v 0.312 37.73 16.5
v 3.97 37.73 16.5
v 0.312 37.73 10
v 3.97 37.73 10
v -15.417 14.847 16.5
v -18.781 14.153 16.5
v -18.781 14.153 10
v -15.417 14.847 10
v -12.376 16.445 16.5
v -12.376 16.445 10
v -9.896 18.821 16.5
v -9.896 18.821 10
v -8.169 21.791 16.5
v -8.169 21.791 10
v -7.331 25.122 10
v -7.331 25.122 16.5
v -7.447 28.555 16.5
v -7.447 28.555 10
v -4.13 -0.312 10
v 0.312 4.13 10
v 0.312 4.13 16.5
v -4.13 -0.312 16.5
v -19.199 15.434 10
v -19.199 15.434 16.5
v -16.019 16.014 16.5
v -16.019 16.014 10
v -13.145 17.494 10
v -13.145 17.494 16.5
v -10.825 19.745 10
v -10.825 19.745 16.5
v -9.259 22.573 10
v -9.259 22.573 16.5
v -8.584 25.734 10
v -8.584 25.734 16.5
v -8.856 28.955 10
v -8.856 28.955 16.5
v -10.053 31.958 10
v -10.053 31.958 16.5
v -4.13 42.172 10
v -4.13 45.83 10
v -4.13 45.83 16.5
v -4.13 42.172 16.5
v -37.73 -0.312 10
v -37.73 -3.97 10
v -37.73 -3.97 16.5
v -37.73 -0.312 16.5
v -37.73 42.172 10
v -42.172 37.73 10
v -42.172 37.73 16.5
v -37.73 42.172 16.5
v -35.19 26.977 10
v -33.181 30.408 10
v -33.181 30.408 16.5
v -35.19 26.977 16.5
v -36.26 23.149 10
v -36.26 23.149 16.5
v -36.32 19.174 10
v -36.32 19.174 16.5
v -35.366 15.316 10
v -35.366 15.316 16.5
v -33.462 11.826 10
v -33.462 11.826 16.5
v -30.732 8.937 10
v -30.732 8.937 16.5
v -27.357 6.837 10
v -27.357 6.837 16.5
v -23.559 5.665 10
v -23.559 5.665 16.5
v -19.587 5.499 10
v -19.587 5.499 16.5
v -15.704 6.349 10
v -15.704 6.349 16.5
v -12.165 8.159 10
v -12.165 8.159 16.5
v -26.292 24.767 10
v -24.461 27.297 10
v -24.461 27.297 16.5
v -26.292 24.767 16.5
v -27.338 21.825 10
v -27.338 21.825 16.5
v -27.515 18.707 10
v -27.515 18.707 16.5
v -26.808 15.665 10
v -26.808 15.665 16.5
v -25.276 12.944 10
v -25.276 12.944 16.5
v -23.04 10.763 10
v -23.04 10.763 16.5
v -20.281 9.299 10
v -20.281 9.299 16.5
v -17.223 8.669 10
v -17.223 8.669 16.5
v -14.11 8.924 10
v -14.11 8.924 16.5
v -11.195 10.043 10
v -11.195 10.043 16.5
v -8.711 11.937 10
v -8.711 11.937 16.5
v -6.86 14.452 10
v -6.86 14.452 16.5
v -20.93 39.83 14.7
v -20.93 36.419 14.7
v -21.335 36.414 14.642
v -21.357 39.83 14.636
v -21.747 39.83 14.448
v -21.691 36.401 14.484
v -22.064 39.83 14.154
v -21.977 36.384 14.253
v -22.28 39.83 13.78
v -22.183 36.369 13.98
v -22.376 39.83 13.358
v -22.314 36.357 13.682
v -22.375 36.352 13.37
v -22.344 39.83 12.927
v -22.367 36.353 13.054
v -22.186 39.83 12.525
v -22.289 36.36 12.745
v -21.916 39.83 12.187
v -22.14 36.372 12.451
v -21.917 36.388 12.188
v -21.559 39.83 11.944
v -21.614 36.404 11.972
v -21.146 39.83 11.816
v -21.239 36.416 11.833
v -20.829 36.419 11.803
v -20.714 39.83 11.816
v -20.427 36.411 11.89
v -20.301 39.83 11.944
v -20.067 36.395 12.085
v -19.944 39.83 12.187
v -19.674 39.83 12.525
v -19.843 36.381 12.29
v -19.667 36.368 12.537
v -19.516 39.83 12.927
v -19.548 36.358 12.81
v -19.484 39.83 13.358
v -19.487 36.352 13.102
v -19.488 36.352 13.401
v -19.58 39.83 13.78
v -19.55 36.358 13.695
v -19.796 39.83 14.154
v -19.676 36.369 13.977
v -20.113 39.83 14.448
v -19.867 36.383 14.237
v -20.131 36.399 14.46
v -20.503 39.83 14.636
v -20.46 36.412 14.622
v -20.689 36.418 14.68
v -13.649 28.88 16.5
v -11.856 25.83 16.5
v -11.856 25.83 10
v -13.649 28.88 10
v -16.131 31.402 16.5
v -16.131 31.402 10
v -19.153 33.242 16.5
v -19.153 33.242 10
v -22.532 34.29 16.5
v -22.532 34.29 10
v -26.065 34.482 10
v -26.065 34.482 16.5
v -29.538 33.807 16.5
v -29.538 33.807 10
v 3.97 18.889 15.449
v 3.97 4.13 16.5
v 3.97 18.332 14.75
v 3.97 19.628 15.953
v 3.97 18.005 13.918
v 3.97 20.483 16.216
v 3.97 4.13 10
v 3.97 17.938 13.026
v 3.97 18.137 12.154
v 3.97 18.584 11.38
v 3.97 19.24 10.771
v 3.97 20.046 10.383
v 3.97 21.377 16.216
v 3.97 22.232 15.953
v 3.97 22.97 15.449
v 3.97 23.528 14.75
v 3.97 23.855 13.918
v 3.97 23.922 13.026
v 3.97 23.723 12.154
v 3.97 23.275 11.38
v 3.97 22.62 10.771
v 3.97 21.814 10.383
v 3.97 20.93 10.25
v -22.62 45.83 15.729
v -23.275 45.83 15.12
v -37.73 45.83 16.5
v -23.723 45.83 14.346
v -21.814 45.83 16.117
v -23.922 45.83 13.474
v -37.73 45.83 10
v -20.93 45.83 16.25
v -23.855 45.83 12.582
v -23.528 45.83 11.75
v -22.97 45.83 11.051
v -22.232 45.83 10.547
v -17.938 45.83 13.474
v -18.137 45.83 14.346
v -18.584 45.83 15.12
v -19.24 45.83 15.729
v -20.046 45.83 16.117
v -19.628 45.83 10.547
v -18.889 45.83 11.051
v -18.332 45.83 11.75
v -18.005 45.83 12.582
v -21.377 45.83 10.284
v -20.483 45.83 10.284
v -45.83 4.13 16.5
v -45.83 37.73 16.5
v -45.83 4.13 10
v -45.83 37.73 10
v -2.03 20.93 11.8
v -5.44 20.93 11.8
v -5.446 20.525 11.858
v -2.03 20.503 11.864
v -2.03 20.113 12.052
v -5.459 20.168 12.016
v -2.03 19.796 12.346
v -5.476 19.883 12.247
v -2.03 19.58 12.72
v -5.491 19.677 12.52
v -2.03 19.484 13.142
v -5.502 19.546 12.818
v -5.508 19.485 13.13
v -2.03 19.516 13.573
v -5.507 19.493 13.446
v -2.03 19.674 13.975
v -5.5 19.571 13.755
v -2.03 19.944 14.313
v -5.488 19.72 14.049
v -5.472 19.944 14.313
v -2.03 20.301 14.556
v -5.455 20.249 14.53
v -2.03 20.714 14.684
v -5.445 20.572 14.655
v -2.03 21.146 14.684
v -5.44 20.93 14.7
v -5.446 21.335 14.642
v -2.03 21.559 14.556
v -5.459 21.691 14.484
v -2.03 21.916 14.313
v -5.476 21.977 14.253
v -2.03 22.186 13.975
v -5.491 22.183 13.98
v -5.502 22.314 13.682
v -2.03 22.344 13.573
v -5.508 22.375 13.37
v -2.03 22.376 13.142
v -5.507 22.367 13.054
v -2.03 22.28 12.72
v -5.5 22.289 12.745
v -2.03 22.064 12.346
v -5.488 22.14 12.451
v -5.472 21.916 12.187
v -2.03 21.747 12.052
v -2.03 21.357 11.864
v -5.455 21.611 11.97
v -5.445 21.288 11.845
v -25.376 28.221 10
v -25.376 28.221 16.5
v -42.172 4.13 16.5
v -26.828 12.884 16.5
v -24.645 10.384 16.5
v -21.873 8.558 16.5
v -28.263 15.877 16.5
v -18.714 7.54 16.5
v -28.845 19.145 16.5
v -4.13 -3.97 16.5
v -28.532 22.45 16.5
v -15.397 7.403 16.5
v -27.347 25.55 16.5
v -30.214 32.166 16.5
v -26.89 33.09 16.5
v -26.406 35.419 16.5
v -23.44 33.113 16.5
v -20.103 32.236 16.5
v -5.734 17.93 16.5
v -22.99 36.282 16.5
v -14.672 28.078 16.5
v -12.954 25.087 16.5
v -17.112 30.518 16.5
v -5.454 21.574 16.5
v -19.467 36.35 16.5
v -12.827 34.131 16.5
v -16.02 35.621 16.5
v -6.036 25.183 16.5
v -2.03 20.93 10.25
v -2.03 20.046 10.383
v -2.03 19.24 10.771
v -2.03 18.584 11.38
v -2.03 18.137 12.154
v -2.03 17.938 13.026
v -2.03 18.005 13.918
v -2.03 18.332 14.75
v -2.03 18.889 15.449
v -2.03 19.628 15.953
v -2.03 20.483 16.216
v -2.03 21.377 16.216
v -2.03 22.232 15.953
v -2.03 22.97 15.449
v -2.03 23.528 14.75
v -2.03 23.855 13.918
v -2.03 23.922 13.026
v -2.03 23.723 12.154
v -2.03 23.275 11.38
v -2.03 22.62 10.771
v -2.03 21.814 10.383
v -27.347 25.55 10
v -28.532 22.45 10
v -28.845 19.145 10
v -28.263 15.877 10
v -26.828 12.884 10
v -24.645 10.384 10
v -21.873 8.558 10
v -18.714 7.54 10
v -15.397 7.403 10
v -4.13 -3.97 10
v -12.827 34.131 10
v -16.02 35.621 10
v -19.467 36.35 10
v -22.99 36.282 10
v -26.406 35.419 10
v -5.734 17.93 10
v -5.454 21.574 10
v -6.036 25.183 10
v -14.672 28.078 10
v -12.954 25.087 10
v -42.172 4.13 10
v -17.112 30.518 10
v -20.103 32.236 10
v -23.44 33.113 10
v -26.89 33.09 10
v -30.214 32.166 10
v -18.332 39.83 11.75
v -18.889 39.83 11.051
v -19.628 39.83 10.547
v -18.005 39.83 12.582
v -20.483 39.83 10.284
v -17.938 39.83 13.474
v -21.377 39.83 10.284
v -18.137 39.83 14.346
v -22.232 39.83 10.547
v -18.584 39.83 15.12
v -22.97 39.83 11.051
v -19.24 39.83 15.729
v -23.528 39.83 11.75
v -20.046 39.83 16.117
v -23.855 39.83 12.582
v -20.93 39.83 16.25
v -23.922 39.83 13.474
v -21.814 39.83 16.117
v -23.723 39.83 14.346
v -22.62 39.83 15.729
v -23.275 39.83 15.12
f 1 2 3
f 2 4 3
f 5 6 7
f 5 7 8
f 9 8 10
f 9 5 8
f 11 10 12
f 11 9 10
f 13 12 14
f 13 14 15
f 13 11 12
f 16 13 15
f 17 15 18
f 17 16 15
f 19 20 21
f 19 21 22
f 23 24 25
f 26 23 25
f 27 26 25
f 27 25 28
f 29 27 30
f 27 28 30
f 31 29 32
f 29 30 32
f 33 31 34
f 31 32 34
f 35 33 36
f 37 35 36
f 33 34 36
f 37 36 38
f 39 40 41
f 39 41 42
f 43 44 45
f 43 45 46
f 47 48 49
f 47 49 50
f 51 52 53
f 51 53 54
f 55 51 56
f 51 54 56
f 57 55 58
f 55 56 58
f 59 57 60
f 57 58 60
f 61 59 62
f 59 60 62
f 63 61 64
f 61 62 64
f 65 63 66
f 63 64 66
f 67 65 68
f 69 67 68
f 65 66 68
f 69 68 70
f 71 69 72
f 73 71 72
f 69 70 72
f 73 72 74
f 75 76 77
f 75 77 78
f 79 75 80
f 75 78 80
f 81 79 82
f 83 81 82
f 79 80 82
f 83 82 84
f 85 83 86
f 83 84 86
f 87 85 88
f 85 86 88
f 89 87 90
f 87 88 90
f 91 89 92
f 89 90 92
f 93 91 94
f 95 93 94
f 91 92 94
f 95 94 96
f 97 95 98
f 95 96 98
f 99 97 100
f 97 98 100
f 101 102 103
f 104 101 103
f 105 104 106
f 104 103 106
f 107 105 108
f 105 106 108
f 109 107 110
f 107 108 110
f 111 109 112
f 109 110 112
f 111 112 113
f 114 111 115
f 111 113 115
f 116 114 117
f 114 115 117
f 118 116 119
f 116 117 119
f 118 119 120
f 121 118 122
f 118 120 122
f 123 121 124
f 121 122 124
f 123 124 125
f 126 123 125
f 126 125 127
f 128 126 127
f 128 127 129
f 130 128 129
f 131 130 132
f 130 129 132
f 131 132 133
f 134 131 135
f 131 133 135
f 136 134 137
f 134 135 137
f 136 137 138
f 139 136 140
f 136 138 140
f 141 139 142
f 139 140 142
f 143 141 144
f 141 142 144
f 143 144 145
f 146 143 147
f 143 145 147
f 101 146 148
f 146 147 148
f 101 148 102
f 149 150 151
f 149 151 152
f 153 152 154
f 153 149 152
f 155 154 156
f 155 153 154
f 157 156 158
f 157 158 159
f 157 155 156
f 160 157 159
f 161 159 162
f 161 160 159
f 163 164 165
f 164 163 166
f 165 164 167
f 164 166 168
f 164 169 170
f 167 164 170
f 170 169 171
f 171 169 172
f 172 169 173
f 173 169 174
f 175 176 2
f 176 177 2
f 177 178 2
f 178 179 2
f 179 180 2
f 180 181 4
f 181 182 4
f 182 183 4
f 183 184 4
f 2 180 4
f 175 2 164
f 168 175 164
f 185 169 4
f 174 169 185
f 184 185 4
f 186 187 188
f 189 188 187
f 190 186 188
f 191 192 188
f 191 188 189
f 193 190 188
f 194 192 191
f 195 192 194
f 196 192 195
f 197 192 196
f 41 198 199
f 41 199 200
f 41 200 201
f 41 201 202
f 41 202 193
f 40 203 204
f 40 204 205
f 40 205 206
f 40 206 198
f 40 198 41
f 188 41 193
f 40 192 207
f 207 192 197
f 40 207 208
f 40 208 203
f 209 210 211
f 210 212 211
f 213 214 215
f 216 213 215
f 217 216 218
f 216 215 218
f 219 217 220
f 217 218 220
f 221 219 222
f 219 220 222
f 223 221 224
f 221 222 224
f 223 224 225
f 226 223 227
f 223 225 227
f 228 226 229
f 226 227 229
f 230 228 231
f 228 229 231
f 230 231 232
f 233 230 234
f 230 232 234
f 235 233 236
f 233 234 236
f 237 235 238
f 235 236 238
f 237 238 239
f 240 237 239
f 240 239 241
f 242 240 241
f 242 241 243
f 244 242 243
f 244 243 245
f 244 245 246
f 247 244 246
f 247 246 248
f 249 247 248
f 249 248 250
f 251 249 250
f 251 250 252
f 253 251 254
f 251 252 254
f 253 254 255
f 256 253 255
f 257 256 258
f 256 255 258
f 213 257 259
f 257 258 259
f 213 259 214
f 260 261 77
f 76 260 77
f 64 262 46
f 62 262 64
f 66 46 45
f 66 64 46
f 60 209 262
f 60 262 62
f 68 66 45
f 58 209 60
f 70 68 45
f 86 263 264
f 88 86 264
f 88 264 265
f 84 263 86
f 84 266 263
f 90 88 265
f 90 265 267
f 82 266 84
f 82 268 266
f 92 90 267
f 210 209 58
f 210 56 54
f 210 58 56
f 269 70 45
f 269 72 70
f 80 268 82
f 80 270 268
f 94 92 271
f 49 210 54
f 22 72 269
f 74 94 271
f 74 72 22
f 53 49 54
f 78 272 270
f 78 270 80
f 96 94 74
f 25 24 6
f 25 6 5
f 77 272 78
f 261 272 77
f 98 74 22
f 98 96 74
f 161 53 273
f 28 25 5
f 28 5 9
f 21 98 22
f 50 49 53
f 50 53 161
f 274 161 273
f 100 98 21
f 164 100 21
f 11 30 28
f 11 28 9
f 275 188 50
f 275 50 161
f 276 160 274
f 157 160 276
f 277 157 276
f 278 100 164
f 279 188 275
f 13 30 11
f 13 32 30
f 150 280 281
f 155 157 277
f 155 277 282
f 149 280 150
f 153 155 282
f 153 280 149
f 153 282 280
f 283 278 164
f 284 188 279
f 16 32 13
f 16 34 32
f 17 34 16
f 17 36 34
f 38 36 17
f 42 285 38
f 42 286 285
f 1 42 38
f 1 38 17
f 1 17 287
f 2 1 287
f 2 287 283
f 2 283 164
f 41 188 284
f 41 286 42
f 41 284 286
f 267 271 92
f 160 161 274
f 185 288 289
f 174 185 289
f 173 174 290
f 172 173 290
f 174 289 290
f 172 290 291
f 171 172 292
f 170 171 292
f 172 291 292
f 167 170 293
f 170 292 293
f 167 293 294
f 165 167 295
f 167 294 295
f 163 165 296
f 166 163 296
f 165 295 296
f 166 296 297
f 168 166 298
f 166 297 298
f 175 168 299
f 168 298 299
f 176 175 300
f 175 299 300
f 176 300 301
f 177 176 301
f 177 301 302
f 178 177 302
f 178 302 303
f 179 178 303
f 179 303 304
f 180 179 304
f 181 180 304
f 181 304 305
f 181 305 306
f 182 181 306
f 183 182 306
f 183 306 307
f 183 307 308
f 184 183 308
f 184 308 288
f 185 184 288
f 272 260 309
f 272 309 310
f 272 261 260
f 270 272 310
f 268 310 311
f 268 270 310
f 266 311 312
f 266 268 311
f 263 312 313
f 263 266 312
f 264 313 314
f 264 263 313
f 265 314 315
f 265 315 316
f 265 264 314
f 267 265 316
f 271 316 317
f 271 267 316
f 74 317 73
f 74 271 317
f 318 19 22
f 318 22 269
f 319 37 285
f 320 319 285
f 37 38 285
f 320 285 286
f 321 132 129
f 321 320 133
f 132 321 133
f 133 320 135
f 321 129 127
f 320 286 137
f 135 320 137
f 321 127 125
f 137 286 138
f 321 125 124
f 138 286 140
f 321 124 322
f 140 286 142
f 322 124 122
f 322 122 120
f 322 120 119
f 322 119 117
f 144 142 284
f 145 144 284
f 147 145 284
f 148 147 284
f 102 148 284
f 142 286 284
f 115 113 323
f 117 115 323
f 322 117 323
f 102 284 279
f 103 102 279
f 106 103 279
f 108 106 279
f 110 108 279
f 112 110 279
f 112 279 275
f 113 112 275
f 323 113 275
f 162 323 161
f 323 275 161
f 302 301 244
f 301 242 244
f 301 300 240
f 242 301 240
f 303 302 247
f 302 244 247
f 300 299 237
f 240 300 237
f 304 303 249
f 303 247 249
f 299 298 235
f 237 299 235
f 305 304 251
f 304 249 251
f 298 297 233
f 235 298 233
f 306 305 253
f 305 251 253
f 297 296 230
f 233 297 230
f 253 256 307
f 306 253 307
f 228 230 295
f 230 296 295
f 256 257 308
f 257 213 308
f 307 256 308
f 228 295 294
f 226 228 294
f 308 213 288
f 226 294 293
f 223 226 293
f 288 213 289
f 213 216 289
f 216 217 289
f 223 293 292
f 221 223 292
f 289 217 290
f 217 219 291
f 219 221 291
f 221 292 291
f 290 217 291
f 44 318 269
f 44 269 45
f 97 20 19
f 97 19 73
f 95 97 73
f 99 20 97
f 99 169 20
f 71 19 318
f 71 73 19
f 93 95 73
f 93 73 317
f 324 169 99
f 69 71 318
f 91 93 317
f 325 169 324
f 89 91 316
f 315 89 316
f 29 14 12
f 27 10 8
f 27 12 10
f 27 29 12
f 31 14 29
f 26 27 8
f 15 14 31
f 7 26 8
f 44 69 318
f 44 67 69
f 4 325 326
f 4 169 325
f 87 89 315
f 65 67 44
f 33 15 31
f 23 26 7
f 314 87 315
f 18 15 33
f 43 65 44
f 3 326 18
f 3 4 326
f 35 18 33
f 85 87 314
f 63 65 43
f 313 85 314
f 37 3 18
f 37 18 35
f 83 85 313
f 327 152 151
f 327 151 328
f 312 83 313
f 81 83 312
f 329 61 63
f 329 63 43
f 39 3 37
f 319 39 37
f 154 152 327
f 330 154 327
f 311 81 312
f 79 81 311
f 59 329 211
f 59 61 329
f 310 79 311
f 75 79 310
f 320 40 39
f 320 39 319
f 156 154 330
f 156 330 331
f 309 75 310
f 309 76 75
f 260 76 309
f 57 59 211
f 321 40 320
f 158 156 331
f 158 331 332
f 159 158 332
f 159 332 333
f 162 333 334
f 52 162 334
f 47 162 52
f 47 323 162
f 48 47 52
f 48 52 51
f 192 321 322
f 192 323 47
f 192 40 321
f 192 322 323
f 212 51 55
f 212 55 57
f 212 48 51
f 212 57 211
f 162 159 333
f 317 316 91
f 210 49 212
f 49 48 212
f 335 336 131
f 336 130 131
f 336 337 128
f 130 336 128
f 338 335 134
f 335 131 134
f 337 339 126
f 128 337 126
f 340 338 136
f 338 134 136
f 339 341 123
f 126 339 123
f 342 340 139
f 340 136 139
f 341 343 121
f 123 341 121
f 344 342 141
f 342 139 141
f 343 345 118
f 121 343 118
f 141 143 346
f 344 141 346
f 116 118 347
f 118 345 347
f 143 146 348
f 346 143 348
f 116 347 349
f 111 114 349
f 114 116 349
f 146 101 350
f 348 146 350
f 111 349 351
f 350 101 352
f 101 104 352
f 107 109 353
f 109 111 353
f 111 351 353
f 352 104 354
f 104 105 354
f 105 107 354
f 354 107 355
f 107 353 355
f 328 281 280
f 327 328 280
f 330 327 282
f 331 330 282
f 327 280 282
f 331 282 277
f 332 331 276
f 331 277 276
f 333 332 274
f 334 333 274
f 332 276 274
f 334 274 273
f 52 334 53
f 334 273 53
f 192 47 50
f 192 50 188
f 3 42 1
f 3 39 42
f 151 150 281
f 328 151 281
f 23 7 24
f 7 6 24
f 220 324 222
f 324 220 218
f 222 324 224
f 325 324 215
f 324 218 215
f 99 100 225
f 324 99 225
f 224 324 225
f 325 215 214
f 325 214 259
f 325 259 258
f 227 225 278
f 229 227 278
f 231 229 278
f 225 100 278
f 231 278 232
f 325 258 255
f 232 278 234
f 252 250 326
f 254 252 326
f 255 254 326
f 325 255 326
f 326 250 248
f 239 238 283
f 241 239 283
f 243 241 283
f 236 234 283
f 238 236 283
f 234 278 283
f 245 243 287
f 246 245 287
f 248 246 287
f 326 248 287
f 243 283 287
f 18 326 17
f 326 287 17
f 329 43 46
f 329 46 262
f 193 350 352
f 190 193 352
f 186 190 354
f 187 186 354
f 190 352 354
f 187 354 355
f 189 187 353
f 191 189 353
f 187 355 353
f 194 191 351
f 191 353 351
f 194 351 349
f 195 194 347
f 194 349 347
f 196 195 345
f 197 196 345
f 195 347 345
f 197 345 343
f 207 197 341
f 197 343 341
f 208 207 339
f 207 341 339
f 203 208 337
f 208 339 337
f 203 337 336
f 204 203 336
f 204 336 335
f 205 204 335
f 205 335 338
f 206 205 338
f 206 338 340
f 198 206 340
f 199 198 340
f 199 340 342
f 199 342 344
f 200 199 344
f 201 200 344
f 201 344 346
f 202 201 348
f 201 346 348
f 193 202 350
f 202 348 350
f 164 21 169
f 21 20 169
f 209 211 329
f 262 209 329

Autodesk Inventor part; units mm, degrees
ref_plane "YZ Plane" through (0, 0, 0) normal (1, 0, 0) x (0, 1, 0)
ref_plane "Work Plane1" through (0, 0, 10) normal (0, 0, 1) x (1, 0, 0)
sketch "Sketch1" plane through (0, 0, 10) normal (0, 0, 1) x (1, 0, 0)
  line L0 (-4.0299, -0.3538) -> (-2.2322, 1.4439) construction
  arc A0 (-1.4439, 2.2322) -> (-2.2322, 1.4439) centre (-0.9299, 0.9299) ccw construction
  line L1 (-1.4439, 2.2322) -> (0.3538, 4.0299) construction
  line L2 (-37.8299, 42.2137) -> (-37.8299, 45.8299) construction
  line L3 (-37.8299, 45.8299) -> (-4.0299, 45.8299) construction
  line L4 (-4.0299, 45.8299) -> (-4.0299, 42.2137) construction
  line L5 (-4.0299, 4.0299) -> (0.3538, 4.0299) projected
  line L6 (-20.9299, 58.9723) -> (17.1124, 20.9299) construction
  line L7 (17.1124, 20.9299) -> (-20.9299, -17.1124) construction
  line L8 (-20.9299, -17.1124) -> (-58.9723, 20.9299) construction
  line L9 (-58.9723, 20.9299) -> (-20.9299, 58.9723) construction
  line L10 (-20.9299, 58.9723) -> (-20.9299, -17.1124) construction
  line L11 (17.1124, 20.9299) -> (-58.9723, 20.9299) construction
  line L12 (-20.9299, 58.9723) -> (32.8701, 58.9723) construction
  line L13 (-43.4299, 43.4299) -> (1.5701, 43.4299) construction
  line L14 (1.5701, 43.4299) -> (1.5701, -1.5701) construction
  line L15 (1.5701, -1.5701) -> (-43.4299, -1.5701) construction
  line L16 (-43.4299, -1.5701) -> (-43.4299, 43.4299) construction
  line L17 (-43.4299, 43.4299) -> (1.5701, -1.5701) construction
  line L18 (1.5701, 43.4299) -> (-43.4299, -1.5701) construction
  line L19 (-43.4299, 5.3876) -> (-43.4299, 36.4723)
  line L20 (-43.4299, 36.4723) -> (-36.4723, 43.4299)
  line L21 (-36.4723, 43.4299) -> (-5.3876, 43.4299)
  line L22 (-5.3876, 43.4299) -> (1.5701, 36.4723)
  line L23 (1.5701, 36.4723) -> (1.5701, 5.3876)
  line L24 (1.5701, 5.3876) -> (-5.3876, -1.5701)
  line L25 (-5.3876, -1.5701) -> (-36.4723, -1.5701)
  line L26 (-36.4723, -1.5701) -> (-43.4299, 5.3876)
  line L27 (-4.0299, 42.2137) -> (-37.8299, 42.2137) projected
  line L28 (-4.0299, -0.3538) -> (-4.0299, 4.0299) projected
  circle A1 centre (-20.9299, 20.9299) radius 13.3985
  circle A2 centre (-20.9299, 20.9299) radius 15.4895
  point P0 (-37.8299, 4.0299)
  dimension "d18" = 53.8
  dimension "d19" = 45
  dimension "d20" = 53.8
  dimension "d21" = 45
  dimension "d22" = 45
  dimension "d30" = 26.797
  dimension "d36" = 30.979
extrude "Extrusion1" add sketch "Sketch1" along normal blind 6.5 contours L28 L24 L25 L26 L19 L20 L27 L22 L23 L5 | L5 L24 L28 | L27 L20 L21 L22 | A1 | A2
ref_plane "Work Plane2" through (-40.9959, 0.8639, 22.2359) normal (0, 0, 1) x (1, 0, 0)
sketch "Sketch3" plane through (0, 0, 10) normal (0, 0, -1) x (-1, 0, 0)
  line L0 (37.8299, -0.4701) -> (37.8299, 4.0299) construction
  line L1 (4.0299, 4.0299) -> (4.0299, -0.4701) construction
  line L2 (37.8299, -0.4701) -> (37.8299, 1.1886) construction
  line L3 (4.0299, -3.9701) -> (4.0299, -0.3538) construction
  line L4 (45.8299, 4.0299) -> (42.2137, 4.0299) construction
  line L5 (-0.3538, 4.0299) -> (-3.9701, 4.0299) construction
  line L6 (-3.9701, 37.8299) -> (-0.3538, 37.8299) construction
  line L7 (4.0299, 42.2137) -> (4.0299, 45.8299) construction
  line L8 (37.8299, 45.8299) -> (37.8299, 42.2137) construction
  line L9 (42.2137, 37.8299) -> (45.8299, 37.8299) construction
  line L10 (37.8299, 37.7299) -> (45.8299, 37.7299)
  line L11 (45.8299, 37.7299) -> (45.8299, 4.1299)
  line L12 (45.8299, 4.1299) -> (37.8299, 4.1299)
  line L13 (37.8299, 4.1299) -> (37.8299, 37.7299)
  line L14 (37.7299, 4.0299) -> (4.1299, 4.0299)
  line L15 (4.1299, 4.0299) -> (4.1299, -3.9701)
  line L16 (4.1299, -3.9701) -> (37.7299, -3.9701)
  line L17 (37.7299, -3.9701) -> (37.7299, 4.0299)
  line L18 (4.0299, 4.1299) -> (-3.9701, 4.1299)
  line L19 (-3.9701, 4.1299) -> (-3.9701, 37.7299)
  line L20 (-3.9701, 37.7299) -> (4.0299, 37.7299)
  line L21 (4.0299, 37.7299) -> (4.0299, 4.1299)
  line L22 (4.1299, 37.8299) -> (37.7299, 37.8299)
  line L23 (37.7299, 37.8299) -> (37.7299, 45.8299)
  line L24 (37.7299, 45.8299) -> (4.1299, 45.8299)
  line L25 (4.1299, 45.8299) -> (4.1299, 37.8299)
  point P0 (0, 0)
  dimension "d23" = 0.1
  dimension "d24" = 0.1
  dimension "d25" = 0.1
  dimension "d26" = 0.1
  dimension "d27" = 0.1
extrude "Extrusion3" add sketch "Sketch3" against normal up to surface (6.5 mm away)
sketch "Sketch6" plane through (0, 0, 16.5) normal (0, 0, 1) x (1, 0, 0)
  circle A0 centre (-20.9299, 20.9299) radius 15.4895
  circle A1 centre (-20.9299, 20.9299) radius 13.3985
  line L0 (-45.8299, 4.1299) -> (-45.8299, 37.7299) projected
  line L1 (-4.1299, -3.9701) -> (-37.7299, -3.9701) projected
  line L2 (-37.7299, 45.8299) -> (-4.1299, 45.8299) projected
  point P0 (0, 0)
  point P1 (-45.8299, 20.9299)
  point P2 (-20.9299, -3.9701)
  point P3 (-20.9299, 45.8299)
  dimension "d37" = 26.797
  dimension "d38" = 30.979
extrude "Extrusion5" cut sketch "Sketch6" against normal blind 12 contours A0 | A1
sketch "Sketch7" plane through (0, 0, 16.5) normal (0, 0, 1) x (1, 0, 0)
  arc A0 (-12.9538, 25.0869) -> (-28.6747, 7.5156) centre (-25.0755, 20.1138) ccw
  arc A1 (-11.8561, 25.8297) -> (-29.5384, 33.807) centre (-25.0755, 20.1138) ccw
  line L0 (-11.8561, 25.8297) -> (-12.9538, 25.0869)
  arc A2 (-29.5384, 33.807) -> (-28.6747, 7.5156) centre (-20.9299, 20.9299) ccw
  arc A3 (-19.1989, 15.4337) -> (-10.0534, 31.9583) centre (-19.562, 26.4277) ccw
  arc A4 (-7.4473, 28.5552) -> (-10.0534, 31.9583) centre (-19.6452, 21.9138) ccw
  line L1 (-19.4299, 22.4299) -> (-3.5175, 22.4299) construction
  arc A5 (-25.3758, 28.221) -> (-12.1653, 8.1586) centre (-16.5552, 19.6486) ccw
  circle A6 centre (-20.9299, 20.9299) radius 15.4895 construction
  arc A7 (-12.4299, 22.4299) -> (-19.1989, 15.4337) centre (-19.4299, 22.4299) ccw construction
  line L2 (-25.3758, 28.221) -> (-24.4607, 27.2973)
  arc A8 (-24.4607, 27.2973) -> (-6.8601, 14.452) centre (-16.5552, 19.6486) ccw
  circle A9 centre (-20.9299, 20.9299) radius 15.4895 construction
  line L3 (3.9701, 4.1299) -> (0.3124, 4.1299) construction
  line L4 (3.9701, 37.7299) -> (3.9701, 4.1299) construction
  line L5 (0.3124, 37.7299) -> (3.9701, 37.7299) construction
  line L6 (0.3124, 37.7299) -> (-4.1299, 42.1723) construction
  line L7 (-4.1299, 45.8299) -> (-4.1299, 42.1723) construction
  line L8 (-37.7299, 45.8299) -> (-4.1299, 45.8299) construction
  line L9 (-37.7299, 42.1723) -> (-37.7299, 45.8299) construction
  line L10 (-37.7299, 42.1723) -> (-42.1723, 37.7299) construction
  line L11 (-45.8299, 37.7299) -> (-42.1723, 37.7299) construction
  line L12 (-45.8299, 4.1299) -> (-45.8299, 37.7299) construction
  line L13 (-42.1723, 4.1299) -> (-45.8299, 4.1299) construction
  line L14 (-42.1723, 4.1299) -> (-37.7299, -0.3124) construction
  line L15 (-37.7299, -3.9701) -> (-37.7299, -0.3124) construction
  line L16 (-4.1299, -3.9701) -> (-37.7299, -3.9701) construction
  line L17 (-4.1299, -0.3124) -> (-4.1299, -3.9701) construction
  line L18 (-4.1299, -0.3124) -> (0.3124, 4.1299) construction
  line L19 (-19.1989, 15.4337) -> (-18.7812, 14.1526) construction
  arc A10 (-19.1989, 15.4337) -> (-12.4299, 22.4299) centre (-19.4299, 22.4299) ccw construction
  arc A11 (-18.7812, 14.1526) -> (-7.4473, 28.5552) centre (-19.562, 26.4277) ccw
  line L20 (-19.1989, 15.4337) -> (-18.7812, 14.1526) construction
  line L21 (-18.7812, 14.1526) -> (-19.1989, 15.4337)
  arc A12 (-12.1653, 8.1586) -> (-6.8601, 14.452) centre (-13.2455, 14.452) ccw
  line L22 (-28.6747, 7.5156) -> (-20.9299, 20.9299) construction
  line L23 (-20.9299, 20.9299) -> (-5.6794, 18.2195) construction
  line L24 (-6.8601, 14.452) -> (-13.2455, 14.452) construction
  circle A13 centre (-20.9299, 20.9299) radius 15.4895 projected
  point P0 (0, 0)
  point P1 (-17.9152, 11.0615)
  point P2 (-33.1816, 30.4073)
  dimension "d58" = 1.3
  dimension "d60" = 1.3
  dimension "d63" = 1.3
  dimension "d78" = 1.5
  dimension "d79" = 1.5
  dimension "d81" = 11
  dimension "d83" = 11
  dimension "d86" = 7
  dimension "d90" = 0
  dimension "d91" = 120
extrude "Extrusion6" add sketch "Sketch7" against normal up to surface (6.5 mm away) contours A0 A2 A1 L0 | A5 L2 A8 A13 | A13 A11 L21 A3 | A4 A13
sketch "Sketch8" plane through (-37.7299, 45.8299, 10) normal (0, 1, 0) x (1, 0, 0)
  line L0 (0, 0) -> (33.6, 0) projected
  line L1 (0, -6.5) -> (33.6, -6.5) projected
  line L2 (33.6, 0) -> (33.6, -6.5) projected
  line L3 (0, 0) -> (0, -6.5) projected
  point P0 (37.7299, 10)
  point P1 (16.8, -3.25)
  point P2 (16.8, 0)
  point P3 (16.8, -6.5)
  point P4 (33.6, -3.25)
  point P5 (0, -3.25)
hole "Hole1" at (-20.9299, 45.8299, 13.25) direction (0, -1, 0) diameter 2.9 depth 11 tip angle 118 counterbore diameter 6 counterbore depth 6
sketch "Sketch9" plane through (3.9701, 4.1299, 10) normal (1, 0, 0) x (0, 0, -1)
  line L0 (0, 0) -> (0, 33.6) projected
  line L1 (-6.5, 33.6) -> (-6.5, 0) projected
  line L2 (0, 33.6) -> (-6.5, 33.6) projected
  line L3 (0, 0) -> (-6.5, 0) projected
  point P0 (10, -4.1299)
  point P1 (-3.25, 16.8)
  point P2 (0, 16.8)
  point P3 (-6.5, 16.8)
  point P4 (-3.25, 33.6)
  point P5 (-3.25, 0)
hole "Hole2" at (3.9701, 20.9299, 13.25) direction (-1, 0, 0) diameter 2.9 depth 11 tip angle 118 counterbore diameter 6 counterbore depth 6
properties part number "50_Cube_Insert_Thorlabs"
